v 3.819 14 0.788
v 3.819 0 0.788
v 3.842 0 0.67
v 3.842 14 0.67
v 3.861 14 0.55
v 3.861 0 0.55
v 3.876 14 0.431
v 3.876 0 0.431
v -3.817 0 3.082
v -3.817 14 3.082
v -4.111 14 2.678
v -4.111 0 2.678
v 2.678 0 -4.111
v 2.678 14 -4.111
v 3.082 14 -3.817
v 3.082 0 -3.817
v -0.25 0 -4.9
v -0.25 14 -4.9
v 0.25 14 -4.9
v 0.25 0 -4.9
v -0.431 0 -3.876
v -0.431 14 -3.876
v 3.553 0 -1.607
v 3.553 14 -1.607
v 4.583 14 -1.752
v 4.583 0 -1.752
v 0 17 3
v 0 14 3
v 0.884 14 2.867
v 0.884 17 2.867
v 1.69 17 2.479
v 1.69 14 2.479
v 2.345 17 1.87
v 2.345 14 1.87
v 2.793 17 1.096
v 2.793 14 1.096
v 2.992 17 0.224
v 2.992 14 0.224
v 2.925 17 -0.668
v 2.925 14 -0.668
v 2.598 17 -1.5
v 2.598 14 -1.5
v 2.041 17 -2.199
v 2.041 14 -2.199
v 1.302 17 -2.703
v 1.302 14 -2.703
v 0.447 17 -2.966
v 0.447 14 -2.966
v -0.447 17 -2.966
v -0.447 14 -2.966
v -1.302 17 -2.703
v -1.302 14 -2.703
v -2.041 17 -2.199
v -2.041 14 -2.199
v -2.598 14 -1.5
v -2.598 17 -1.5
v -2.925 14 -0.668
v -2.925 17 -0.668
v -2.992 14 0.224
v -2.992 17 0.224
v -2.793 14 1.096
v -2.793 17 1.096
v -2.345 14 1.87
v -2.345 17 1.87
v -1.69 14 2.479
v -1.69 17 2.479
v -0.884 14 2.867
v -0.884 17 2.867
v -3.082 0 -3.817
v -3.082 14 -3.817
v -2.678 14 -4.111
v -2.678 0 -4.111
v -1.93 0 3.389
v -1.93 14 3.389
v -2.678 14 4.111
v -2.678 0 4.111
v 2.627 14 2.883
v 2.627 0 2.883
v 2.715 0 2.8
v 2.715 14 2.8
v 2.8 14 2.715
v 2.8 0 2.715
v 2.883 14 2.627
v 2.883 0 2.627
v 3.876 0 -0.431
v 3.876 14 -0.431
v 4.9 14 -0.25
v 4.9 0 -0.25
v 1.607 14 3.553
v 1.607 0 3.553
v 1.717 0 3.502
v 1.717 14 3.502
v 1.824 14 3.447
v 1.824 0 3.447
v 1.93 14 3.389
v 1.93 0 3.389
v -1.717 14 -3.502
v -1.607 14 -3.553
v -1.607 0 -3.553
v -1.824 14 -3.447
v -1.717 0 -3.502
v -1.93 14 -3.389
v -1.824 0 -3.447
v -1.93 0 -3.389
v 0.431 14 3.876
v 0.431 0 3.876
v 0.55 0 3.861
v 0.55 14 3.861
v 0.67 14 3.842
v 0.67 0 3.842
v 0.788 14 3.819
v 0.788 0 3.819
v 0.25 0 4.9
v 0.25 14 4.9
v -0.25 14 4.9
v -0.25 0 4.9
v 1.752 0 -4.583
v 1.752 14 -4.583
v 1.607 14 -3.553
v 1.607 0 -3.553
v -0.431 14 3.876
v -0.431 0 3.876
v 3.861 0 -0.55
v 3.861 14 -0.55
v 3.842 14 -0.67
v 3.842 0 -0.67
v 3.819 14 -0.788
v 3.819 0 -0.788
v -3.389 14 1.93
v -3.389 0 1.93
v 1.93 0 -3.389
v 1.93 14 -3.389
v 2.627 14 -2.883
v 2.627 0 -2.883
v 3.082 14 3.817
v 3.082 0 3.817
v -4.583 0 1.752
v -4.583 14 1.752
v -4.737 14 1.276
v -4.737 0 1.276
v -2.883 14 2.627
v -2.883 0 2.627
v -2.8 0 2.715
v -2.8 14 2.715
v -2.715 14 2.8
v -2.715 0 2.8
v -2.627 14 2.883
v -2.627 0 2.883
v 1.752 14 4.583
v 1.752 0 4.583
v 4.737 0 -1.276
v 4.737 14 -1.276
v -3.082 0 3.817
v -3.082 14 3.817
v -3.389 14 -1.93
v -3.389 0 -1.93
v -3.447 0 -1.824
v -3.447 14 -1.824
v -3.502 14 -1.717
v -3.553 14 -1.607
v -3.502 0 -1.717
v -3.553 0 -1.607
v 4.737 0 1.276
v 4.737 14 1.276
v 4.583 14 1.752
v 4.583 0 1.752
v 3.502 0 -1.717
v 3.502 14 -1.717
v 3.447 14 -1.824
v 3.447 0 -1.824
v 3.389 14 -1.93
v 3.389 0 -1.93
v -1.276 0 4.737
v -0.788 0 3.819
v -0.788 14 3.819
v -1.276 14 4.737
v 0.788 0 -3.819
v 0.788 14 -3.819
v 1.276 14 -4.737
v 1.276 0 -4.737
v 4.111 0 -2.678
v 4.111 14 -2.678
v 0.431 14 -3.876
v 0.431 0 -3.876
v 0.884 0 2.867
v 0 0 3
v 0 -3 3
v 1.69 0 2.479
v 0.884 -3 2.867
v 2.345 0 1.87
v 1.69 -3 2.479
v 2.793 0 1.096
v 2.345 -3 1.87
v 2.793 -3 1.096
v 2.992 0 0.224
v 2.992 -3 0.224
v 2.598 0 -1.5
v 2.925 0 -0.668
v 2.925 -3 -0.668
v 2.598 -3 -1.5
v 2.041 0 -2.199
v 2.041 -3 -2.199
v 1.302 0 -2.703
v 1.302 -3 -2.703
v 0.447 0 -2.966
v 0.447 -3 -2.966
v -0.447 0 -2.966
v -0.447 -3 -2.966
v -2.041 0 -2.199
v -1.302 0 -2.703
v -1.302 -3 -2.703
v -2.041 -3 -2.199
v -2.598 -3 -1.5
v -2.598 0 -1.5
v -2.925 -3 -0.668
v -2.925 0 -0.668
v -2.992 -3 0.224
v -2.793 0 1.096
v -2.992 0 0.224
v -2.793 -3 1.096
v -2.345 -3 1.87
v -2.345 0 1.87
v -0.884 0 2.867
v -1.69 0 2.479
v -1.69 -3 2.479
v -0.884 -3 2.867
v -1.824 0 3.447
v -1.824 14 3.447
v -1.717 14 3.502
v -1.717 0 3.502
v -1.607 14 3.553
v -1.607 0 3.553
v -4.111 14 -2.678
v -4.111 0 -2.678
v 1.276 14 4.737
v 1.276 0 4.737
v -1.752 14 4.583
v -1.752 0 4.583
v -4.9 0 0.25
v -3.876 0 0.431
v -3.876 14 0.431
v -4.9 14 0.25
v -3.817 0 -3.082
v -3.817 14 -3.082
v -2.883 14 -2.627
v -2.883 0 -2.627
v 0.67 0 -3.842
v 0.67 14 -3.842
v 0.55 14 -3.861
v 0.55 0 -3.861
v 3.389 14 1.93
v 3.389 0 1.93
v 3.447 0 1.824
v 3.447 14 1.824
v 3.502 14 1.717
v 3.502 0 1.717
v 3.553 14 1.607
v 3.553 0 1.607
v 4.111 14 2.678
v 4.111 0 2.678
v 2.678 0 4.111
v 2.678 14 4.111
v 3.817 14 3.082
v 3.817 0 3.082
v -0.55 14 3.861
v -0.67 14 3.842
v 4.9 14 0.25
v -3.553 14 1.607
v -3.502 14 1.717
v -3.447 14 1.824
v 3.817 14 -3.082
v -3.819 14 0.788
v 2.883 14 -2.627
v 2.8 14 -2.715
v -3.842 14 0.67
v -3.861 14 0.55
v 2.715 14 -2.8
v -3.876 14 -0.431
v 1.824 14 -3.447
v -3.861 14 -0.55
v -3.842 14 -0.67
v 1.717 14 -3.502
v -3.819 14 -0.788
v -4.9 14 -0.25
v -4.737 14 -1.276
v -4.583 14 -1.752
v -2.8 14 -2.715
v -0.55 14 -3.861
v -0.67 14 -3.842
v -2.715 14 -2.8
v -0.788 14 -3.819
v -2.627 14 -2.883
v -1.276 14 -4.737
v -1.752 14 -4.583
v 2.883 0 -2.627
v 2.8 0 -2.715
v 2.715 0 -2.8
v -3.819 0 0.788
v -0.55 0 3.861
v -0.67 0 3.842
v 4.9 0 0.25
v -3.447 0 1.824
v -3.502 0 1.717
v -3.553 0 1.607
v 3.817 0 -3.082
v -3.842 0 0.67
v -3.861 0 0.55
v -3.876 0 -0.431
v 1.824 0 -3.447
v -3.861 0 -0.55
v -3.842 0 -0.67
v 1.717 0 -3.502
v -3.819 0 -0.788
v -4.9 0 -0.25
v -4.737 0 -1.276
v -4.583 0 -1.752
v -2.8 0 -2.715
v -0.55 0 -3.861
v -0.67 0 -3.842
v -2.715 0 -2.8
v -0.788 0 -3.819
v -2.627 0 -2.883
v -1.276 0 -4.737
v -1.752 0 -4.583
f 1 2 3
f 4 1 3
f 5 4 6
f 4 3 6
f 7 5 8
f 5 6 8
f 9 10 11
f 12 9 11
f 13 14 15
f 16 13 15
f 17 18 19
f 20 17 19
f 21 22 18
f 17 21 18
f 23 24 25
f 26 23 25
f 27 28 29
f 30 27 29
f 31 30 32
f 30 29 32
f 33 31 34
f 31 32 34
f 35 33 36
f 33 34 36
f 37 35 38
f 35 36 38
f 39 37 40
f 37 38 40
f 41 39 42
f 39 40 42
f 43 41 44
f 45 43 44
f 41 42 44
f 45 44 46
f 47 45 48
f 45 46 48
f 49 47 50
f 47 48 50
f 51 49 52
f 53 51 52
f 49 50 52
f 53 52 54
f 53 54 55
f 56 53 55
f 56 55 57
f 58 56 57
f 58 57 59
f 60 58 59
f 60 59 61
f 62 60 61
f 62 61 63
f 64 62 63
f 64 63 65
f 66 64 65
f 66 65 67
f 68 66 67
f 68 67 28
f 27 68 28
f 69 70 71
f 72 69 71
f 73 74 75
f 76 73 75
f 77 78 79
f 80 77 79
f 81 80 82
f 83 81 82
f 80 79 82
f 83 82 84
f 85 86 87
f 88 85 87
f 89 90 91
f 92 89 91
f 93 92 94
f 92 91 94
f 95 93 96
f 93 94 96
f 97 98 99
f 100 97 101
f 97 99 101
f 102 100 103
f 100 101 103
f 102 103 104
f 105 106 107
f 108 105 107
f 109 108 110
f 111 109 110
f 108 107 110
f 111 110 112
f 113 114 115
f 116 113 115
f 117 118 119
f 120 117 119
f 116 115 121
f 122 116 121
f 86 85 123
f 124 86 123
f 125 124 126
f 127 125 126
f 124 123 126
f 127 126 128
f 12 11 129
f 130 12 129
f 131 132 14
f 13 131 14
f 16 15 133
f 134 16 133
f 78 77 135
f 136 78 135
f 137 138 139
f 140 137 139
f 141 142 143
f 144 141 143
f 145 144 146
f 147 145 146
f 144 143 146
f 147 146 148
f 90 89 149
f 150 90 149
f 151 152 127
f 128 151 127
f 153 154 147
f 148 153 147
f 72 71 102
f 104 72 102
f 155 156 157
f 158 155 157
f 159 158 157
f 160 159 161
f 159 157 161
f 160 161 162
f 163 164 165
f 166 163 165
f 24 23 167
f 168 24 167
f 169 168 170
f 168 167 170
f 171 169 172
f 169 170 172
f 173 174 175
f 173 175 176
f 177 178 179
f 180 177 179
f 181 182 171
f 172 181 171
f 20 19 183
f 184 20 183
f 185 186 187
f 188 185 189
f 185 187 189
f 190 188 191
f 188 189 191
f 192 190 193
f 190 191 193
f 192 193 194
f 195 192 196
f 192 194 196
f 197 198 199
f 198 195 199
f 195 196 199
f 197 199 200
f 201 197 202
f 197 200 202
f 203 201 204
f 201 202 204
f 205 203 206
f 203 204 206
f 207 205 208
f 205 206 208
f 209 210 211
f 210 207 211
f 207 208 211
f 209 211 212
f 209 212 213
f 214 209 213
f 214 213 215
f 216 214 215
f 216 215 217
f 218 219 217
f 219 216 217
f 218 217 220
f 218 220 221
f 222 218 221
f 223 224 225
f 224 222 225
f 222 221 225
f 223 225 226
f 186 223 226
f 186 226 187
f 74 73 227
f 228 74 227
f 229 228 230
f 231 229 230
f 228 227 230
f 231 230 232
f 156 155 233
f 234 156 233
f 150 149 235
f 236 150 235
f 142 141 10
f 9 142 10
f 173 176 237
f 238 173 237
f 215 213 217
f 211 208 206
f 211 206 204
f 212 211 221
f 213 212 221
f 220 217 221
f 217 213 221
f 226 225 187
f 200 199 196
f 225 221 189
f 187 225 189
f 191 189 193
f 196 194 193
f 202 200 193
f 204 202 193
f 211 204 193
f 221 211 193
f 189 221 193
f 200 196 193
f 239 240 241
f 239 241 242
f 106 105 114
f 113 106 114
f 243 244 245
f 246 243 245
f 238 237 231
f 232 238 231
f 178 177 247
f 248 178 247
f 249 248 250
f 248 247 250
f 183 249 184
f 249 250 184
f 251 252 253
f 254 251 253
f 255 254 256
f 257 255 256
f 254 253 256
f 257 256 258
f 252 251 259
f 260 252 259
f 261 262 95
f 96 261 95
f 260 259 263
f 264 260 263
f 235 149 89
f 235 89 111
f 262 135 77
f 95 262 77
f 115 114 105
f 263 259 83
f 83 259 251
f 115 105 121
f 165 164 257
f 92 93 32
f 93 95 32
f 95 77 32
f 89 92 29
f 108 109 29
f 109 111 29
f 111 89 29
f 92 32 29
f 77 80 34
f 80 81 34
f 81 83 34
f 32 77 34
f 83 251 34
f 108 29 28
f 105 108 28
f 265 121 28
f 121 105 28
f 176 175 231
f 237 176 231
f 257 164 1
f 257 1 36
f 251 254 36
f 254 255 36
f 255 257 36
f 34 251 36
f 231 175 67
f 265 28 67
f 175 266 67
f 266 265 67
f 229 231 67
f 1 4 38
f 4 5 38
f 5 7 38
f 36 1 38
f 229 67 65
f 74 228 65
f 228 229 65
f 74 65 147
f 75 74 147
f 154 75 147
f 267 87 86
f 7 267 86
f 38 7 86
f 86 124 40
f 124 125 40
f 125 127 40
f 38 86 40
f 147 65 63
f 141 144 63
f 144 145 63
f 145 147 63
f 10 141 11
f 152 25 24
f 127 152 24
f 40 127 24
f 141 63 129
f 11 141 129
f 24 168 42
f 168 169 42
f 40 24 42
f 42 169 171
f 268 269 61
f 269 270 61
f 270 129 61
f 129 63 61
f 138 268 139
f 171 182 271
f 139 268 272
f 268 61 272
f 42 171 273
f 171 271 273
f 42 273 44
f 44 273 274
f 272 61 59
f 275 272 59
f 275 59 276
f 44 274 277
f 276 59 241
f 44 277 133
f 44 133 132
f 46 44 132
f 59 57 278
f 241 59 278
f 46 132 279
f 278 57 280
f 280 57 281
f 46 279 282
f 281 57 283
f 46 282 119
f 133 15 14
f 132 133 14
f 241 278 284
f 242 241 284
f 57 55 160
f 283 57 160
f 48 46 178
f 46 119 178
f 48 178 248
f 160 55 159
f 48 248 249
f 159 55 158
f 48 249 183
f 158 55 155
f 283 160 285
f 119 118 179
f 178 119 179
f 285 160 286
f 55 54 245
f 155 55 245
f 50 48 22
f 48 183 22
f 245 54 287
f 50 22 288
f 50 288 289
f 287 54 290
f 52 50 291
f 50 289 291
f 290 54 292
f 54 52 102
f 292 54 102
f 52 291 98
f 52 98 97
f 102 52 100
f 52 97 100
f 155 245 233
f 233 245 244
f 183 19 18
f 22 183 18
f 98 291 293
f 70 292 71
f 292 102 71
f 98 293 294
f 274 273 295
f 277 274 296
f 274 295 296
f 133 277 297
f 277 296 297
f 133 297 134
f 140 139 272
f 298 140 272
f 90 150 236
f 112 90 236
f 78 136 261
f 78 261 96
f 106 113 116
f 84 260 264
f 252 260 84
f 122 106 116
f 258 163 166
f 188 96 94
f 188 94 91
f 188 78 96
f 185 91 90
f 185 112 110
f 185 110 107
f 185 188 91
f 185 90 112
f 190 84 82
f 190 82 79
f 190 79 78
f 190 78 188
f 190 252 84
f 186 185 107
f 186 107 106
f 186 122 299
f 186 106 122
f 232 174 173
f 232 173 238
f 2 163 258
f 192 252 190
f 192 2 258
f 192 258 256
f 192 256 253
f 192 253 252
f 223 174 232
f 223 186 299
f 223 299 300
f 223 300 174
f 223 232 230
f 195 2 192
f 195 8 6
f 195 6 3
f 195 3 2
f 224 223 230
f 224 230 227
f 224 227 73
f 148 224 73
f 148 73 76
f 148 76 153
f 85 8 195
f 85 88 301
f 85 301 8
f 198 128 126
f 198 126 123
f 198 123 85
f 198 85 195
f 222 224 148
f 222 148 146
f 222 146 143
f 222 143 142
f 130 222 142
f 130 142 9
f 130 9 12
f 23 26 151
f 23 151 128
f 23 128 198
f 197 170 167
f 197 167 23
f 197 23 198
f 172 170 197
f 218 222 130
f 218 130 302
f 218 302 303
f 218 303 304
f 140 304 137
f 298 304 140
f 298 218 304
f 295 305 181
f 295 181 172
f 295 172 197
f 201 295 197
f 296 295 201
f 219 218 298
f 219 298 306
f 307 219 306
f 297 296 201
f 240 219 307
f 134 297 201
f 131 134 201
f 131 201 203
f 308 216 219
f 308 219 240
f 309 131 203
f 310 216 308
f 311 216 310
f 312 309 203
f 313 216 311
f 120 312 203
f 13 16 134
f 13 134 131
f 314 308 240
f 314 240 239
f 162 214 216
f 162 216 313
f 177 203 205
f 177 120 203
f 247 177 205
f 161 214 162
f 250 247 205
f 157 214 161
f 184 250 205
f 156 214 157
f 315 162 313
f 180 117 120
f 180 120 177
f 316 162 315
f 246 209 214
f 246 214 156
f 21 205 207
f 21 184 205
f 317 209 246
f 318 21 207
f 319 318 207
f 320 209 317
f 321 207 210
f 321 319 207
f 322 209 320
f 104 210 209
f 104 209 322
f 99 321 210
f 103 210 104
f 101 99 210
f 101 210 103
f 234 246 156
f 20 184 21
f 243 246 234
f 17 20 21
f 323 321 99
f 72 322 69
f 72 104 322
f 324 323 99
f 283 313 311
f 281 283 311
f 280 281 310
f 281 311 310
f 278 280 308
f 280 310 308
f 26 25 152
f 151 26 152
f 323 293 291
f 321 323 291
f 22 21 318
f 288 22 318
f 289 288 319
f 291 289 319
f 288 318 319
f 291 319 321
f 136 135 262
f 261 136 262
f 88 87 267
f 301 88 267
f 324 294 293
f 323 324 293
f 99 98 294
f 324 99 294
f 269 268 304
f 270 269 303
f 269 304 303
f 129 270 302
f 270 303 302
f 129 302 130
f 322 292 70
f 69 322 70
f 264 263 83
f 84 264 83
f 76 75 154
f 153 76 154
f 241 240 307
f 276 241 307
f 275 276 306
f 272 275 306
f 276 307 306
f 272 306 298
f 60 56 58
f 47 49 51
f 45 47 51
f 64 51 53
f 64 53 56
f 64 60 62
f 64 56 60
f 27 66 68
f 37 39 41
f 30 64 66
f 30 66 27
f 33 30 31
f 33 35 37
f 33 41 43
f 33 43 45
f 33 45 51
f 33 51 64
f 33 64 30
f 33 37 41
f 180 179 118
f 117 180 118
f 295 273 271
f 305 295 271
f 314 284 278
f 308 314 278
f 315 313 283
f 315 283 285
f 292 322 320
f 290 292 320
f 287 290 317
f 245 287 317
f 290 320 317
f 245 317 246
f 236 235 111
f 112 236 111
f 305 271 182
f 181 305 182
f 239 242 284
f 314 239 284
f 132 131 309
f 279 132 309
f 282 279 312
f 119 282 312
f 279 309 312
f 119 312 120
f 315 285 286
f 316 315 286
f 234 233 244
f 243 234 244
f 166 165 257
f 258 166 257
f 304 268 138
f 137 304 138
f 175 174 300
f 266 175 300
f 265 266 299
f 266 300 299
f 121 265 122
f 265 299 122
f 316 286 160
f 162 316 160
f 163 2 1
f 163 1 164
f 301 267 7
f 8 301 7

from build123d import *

# Parameters (mm, degrees)
SKETCH1_R                = 3.9
BOSS_EXTRUDE1_DEPTH      = 14
BOSS_EXTRUDE2_DEPTH      = 14
CIRPATTERN1_COUNT        = 20
BOSS_EXTRUDE3_DEPTH      = 3
BOSS_EXTRUDE3_DEPTH_BACK = 17
SKETCH5_R                = 3


with BuildPart() as part:
    # Sketch1 → Boss-Extrude1 (new body)
    with BuildSketch(Plane(origin=(0, 0, 0), x_dir=(1, 0, 0), z_dir=(0, 1, 0))):
        with Locations(Location((0, 0, 0), (0, 0, 270))):
            Circle(SKETCH1_R)
    extrude(amount=BOSS_EXTRUDE1_DEPTH)

    # Sketch2 → Boss-Extrude2 (add)
    with BuildSketch(Plane(origin=(0, 14, 0), x_dir=(1, 0, 0), z_dir=(0, 1, 0))):
        Polygon((-0.25, 4.9), (0.25, 4.9), (0.64014281, 2.687390175), (-0.64014281, 2.687390175), align=None)
    boss_extrude2 = extrude(amount=-BOSS_EXTRUDE2_DEPTH)

    # CirPattern1: Boss-Extrude2 ×20 about axis
    cirpattern1_axis = Axis((0, 0, 0), (0, 1, 0))
    for i in range(1, CIRPATTERN1_COUNT):
        add(boss_extrude2.rotate(cirpattern1_axis, i * 360 / CIRPATTERN1_COUNT))

    # Sketch5 → Boss-Extrude3 (add, two sides: drawn at the far end of the back side and taken through both)
    with BuildSketch(Plane(origin=(0, 14, 0), x_dir=(1, 0, 0), z_dir=(0, 1, 0)).offset(-BOSS_EXTRUDE3_DEPTH_BACK)):
        with Locations(Location((0, 0, 0), (0, 0, 270))):
            Circle(SKETCH5_R)
    extrude(amount=BOSS_EXTRUDE3_DEPTH + BOSS_EXTRUDE3_DEPTH_BACK)


solid = part.part
